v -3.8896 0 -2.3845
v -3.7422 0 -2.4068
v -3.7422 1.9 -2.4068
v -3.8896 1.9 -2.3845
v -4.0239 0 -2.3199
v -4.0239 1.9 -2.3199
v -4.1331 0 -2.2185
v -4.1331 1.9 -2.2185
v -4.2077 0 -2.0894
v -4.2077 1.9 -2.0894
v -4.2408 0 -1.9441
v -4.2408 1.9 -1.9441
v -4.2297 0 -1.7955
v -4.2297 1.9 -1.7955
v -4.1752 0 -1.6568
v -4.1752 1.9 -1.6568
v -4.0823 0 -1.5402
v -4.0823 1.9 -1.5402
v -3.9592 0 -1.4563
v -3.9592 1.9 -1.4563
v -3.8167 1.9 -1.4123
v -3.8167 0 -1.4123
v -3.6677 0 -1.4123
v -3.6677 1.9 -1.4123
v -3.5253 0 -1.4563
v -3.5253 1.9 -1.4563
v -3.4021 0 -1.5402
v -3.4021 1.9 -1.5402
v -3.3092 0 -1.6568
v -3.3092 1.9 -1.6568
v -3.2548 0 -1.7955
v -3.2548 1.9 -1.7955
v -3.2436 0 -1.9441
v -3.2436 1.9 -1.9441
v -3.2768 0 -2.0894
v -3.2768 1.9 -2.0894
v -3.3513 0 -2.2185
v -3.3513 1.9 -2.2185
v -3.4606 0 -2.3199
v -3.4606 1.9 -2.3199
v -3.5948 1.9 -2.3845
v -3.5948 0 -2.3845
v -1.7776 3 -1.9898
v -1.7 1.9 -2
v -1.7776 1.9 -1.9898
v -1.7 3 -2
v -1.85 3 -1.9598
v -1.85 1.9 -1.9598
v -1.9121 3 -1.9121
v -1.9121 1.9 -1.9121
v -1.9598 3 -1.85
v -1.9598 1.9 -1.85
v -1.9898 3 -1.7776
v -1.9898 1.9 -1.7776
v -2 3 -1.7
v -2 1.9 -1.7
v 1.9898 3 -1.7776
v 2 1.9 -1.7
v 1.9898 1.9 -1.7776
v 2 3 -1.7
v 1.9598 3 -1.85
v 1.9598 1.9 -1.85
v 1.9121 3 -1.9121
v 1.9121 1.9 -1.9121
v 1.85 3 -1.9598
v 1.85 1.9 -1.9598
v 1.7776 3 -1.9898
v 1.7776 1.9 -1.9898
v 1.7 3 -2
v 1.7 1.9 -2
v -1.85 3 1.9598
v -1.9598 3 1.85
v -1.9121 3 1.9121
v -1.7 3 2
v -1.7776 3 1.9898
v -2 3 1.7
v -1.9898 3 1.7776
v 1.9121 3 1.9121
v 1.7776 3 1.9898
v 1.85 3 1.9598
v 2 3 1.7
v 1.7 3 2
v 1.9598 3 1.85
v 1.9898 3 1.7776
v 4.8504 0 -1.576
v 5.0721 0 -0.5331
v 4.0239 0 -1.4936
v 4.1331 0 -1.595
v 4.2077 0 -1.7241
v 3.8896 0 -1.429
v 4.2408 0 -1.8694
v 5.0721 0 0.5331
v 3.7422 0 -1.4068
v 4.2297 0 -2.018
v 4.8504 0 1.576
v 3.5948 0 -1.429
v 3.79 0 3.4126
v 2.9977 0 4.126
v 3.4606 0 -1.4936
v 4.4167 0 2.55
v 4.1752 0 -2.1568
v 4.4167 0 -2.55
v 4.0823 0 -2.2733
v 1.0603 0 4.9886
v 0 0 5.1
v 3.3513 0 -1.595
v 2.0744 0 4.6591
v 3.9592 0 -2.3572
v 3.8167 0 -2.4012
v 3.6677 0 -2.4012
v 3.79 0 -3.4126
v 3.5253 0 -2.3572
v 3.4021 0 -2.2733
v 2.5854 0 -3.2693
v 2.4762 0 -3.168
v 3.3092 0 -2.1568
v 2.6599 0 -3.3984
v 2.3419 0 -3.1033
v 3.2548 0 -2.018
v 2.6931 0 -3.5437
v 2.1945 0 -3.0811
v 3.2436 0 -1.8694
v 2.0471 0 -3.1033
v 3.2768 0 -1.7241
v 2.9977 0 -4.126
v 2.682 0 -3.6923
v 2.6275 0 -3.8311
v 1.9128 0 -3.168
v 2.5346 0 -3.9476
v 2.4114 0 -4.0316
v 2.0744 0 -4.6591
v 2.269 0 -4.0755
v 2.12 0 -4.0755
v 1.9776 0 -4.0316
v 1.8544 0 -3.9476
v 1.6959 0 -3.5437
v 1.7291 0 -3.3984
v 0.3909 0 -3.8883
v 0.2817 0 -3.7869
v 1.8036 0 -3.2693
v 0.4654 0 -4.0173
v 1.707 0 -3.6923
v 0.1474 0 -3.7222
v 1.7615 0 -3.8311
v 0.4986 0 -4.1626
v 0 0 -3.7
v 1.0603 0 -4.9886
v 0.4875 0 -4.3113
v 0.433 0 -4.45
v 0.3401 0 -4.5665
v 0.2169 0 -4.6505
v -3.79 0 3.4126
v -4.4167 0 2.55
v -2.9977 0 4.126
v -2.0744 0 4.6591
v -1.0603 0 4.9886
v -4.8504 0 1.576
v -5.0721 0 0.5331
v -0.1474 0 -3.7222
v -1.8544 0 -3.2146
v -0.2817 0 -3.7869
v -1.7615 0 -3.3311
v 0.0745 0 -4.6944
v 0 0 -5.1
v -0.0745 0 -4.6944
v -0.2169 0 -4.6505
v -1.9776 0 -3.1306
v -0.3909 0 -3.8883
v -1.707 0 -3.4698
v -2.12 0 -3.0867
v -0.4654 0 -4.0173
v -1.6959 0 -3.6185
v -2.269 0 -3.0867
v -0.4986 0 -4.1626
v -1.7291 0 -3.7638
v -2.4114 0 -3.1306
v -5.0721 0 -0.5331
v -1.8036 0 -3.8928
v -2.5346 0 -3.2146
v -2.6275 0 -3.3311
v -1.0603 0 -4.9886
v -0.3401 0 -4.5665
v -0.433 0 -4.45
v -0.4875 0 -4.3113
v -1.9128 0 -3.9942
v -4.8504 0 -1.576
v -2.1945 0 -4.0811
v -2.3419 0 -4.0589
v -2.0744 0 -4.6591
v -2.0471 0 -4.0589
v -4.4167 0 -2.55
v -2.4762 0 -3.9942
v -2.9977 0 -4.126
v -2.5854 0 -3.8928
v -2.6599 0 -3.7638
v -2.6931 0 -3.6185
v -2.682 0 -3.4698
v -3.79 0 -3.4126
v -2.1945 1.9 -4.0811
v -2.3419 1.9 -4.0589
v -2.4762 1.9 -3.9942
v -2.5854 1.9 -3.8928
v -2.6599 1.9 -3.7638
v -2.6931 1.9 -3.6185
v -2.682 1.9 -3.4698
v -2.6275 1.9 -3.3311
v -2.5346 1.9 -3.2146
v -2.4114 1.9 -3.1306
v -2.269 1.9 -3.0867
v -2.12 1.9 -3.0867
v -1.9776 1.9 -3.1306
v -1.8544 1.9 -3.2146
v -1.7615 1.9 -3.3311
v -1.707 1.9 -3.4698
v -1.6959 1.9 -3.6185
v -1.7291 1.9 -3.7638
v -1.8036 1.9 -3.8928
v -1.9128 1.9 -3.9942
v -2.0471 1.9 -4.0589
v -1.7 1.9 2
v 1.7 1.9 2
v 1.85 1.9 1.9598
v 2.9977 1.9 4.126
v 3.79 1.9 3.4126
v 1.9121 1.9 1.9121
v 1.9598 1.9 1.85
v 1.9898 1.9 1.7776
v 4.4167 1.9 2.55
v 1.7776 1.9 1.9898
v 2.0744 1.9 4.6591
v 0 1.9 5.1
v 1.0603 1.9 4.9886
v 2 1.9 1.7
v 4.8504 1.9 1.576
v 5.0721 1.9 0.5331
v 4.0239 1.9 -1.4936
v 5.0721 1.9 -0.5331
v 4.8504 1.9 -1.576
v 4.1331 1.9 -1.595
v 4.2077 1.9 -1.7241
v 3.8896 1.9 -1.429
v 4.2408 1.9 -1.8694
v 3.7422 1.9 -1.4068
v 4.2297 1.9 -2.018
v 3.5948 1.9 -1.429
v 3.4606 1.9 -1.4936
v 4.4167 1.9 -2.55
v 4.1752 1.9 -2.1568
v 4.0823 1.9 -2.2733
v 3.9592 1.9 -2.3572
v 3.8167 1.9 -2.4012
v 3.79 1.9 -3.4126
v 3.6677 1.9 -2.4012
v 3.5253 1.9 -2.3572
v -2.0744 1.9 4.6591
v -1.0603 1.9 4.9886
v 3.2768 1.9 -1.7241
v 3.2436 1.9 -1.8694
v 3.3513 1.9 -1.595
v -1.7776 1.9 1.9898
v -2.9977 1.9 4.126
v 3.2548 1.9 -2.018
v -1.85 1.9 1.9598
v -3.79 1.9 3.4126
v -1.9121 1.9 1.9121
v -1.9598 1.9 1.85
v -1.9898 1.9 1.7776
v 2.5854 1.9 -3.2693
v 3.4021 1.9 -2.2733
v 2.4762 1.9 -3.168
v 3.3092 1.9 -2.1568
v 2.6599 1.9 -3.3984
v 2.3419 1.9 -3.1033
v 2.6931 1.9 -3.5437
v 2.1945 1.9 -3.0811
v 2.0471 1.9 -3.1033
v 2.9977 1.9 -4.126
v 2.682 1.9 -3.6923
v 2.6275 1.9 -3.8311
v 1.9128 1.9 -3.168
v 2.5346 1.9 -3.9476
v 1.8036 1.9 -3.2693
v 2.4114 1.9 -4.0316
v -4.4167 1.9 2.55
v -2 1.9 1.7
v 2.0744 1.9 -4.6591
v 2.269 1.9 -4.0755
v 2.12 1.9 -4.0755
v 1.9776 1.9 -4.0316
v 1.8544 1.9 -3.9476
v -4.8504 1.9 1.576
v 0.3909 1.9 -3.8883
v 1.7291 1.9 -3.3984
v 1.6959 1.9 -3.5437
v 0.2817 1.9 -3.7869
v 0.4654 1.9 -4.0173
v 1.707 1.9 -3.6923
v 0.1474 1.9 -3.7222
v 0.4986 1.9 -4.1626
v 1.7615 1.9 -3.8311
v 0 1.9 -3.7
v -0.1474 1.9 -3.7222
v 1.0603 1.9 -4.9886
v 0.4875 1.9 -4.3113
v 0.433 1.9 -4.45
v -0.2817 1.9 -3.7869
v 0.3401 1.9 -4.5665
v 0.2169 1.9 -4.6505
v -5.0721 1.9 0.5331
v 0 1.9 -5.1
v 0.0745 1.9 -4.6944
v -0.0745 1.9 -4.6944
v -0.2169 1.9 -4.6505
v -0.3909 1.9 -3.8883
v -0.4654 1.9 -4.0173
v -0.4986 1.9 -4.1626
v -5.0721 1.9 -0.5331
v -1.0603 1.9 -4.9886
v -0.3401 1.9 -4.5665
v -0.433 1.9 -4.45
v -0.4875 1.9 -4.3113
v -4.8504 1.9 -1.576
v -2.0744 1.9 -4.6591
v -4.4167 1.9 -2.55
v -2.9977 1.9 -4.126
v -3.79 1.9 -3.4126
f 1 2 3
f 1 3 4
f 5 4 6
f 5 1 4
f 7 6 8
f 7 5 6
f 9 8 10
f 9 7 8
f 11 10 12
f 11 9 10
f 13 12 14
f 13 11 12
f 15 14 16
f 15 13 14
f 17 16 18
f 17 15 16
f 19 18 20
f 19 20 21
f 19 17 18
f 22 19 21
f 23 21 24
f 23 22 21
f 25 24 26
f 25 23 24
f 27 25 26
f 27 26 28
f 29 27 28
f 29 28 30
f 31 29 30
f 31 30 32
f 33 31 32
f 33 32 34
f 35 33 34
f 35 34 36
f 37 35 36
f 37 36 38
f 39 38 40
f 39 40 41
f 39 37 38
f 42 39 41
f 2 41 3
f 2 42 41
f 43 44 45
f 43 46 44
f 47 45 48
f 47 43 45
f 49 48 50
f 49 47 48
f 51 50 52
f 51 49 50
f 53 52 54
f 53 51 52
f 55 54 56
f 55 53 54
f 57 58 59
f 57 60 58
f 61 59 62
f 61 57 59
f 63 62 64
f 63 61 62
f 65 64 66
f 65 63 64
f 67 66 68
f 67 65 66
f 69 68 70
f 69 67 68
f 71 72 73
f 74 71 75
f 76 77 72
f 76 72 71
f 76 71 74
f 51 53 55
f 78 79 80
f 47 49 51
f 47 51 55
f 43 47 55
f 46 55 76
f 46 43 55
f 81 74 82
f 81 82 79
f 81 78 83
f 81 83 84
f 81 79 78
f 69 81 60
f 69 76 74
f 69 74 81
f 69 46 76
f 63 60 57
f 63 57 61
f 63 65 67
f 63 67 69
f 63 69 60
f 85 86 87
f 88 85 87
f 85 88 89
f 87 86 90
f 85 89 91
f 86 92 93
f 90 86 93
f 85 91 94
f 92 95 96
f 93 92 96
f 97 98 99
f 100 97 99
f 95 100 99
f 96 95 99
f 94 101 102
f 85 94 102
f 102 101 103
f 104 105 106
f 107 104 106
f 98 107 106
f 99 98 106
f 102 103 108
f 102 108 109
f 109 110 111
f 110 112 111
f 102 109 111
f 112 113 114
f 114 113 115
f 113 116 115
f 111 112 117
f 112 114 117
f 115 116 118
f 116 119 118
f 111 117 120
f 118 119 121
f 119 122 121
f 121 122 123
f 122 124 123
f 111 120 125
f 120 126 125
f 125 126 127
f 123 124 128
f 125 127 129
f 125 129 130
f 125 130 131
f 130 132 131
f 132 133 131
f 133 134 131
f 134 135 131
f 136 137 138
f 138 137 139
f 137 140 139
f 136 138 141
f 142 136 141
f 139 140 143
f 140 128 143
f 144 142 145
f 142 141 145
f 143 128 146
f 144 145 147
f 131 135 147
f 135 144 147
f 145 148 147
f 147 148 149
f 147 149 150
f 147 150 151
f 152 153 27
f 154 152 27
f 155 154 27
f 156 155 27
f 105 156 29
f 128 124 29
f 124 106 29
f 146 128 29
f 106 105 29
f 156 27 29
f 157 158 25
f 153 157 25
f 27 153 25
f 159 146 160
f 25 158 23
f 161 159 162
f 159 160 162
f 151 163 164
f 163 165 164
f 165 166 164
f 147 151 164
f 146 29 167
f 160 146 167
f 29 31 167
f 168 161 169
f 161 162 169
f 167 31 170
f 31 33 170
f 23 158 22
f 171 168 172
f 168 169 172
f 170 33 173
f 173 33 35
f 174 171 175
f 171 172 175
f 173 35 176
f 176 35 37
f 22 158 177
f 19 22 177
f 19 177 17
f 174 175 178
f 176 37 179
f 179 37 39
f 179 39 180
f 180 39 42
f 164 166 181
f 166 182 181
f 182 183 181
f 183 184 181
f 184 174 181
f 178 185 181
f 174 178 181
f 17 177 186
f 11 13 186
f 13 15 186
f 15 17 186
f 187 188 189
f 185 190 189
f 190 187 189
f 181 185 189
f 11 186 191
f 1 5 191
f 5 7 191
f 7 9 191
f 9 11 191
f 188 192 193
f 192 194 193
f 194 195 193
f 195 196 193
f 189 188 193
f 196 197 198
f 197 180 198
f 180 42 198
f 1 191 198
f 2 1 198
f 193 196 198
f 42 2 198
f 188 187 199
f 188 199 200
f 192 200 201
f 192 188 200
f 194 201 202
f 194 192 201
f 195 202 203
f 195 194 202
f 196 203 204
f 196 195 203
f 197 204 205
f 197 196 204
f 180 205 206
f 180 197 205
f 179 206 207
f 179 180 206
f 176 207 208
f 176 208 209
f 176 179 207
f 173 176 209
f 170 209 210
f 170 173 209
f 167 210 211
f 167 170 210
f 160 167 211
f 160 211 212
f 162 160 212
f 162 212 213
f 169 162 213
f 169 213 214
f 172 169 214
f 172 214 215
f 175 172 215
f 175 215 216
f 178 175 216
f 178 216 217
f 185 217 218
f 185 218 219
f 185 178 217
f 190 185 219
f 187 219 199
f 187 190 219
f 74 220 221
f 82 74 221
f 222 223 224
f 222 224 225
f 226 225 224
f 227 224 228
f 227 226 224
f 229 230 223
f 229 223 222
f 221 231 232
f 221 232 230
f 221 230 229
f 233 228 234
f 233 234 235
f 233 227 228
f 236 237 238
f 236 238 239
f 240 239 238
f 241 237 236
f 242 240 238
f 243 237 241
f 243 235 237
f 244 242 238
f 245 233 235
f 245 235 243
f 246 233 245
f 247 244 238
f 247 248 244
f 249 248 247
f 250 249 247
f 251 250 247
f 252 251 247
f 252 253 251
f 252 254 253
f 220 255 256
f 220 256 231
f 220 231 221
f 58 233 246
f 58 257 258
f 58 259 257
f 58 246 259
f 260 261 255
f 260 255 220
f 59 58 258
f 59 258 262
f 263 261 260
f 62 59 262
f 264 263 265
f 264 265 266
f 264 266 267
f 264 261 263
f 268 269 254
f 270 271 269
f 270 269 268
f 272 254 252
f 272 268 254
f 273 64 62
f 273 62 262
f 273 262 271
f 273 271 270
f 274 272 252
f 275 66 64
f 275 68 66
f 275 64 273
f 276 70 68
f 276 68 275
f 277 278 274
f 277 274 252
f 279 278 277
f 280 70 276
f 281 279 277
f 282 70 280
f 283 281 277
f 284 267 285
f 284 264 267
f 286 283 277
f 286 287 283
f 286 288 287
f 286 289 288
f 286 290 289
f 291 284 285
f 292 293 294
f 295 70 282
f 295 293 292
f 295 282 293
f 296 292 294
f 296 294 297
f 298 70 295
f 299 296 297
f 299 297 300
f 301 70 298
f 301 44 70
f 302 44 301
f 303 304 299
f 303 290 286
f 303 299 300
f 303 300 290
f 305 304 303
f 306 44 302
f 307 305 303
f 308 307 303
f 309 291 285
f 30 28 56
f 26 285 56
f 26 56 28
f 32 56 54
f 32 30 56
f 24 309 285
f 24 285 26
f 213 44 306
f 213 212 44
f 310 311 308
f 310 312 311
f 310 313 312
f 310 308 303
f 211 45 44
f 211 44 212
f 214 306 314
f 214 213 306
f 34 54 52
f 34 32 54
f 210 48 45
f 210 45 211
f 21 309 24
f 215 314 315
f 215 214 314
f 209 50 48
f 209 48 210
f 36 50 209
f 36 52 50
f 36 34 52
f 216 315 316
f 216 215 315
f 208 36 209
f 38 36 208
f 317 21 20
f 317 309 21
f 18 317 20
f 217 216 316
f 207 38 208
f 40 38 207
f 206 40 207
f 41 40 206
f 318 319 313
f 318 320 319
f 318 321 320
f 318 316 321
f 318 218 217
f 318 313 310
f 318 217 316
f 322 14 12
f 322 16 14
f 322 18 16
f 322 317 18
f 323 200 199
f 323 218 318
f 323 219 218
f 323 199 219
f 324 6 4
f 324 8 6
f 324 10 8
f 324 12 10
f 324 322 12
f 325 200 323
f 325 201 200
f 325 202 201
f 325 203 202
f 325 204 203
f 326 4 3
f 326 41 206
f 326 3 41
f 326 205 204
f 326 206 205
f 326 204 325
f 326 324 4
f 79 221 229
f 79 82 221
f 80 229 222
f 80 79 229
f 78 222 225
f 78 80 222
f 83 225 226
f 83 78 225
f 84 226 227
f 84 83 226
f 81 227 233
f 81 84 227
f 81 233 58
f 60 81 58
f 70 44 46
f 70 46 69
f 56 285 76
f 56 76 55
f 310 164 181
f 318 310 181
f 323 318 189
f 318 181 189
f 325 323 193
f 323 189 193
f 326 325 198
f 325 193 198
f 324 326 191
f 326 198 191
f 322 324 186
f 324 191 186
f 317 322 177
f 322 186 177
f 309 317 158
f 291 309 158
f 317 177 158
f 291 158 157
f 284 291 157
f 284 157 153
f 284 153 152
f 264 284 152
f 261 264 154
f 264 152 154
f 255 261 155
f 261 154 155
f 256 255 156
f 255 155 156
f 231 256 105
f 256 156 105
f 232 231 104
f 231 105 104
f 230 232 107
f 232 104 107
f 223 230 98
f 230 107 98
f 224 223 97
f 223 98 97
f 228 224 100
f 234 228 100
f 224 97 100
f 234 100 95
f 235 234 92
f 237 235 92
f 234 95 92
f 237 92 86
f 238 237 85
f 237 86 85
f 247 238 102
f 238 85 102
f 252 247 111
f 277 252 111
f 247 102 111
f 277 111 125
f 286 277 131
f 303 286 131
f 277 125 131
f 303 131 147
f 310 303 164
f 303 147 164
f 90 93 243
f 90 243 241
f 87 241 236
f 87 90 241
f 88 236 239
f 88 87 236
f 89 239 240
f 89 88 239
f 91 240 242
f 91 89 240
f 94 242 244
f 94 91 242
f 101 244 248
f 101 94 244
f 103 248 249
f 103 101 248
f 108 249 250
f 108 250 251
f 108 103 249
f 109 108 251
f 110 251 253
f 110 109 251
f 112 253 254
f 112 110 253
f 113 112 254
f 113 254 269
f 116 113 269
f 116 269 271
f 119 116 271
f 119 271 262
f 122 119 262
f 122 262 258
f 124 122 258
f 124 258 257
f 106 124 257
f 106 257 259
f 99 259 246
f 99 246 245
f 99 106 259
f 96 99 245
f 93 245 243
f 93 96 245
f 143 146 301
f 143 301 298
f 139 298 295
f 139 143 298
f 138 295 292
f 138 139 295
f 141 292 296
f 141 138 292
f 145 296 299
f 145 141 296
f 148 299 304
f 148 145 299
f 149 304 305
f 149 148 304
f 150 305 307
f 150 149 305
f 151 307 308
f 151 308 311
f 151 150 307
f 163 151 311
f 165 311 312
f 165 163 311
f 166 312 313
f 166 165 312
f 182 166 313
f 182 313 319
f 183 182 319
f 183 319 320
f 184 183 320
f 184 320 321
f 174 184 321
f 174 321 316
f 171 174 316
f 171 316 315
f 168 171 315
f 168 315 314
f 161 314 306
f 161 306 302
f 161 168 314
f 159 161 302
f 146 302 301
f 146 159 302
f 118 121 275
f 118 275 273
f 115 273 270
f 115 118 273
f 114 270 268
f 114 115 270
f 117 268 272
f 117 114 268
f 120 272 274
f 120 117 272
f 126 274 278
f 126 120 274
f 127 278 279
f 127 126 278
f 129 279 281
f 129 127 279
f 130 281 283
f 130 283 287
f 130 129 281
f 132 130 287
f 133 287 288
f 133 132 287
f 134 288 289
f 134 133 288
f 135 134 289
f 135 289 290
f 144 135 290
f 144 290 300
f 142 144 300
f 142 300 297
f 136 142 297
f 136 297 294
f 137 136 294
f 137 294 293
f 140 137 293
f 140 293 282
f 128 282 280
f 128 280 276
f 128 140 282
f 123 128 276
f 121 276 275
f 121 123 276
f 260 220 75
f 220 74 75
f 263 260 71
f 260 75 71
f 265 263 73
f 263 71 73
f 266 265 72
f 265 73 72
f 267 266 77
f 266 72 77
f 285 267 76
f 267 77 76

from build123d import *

# Parameters (mm, degrees)
SKIZZE1_R                       = 5.1
SKIZZE1_R_2                     = 0.5
AUFSATZ_LINEAR_AUSTRAGEN1_DEPTH = 1.9
SKIZZE2_W                       = 4
SKIZZE2_H                       = 4
AUFSATZ_LINEAR_AUSTRAGEN2_DEPTH = 1.1
VERRUNDUNG1_R                   = 0.3


with BuildPart() as part:
    # Skizze1 → Aufsatz-Linear austragen1 (new body)
    with BuildSketch(Plane(origin=(0, 0, 0), x_dir=(1, 0, 0), z_dir=(0, 1, 0))):
        Circle(SKIZZE1_R)
        with Locations((0, 4.2)):
            Circle(SKIZZE1_R_2, mode=Mode.SUBTRACT)
        with Locations((2.194493972, 3.58108869)):
            Circle(SKIZZE1_R_2, mode=Mode.SUBTRACT)
        with Locations((3.742227402, 1.906760099)):
            Circle(SKIZZE1_R_2, mode=Mode.SUBTRACT)
        with Locations((-3.742227402, 1.906760099)):
            Circle(SKIZZE1_R_2, mode=Mode.SUBTRACT)
        with Locations((-2.194493972, 3.58108869)):
            Circle(SKIZZE1_R_2, mode=Mode.SUBTRACT)
    extrude(amount=AUFSATZ_LINEAR_AUSTRAGEN1_DEPTH)

    # Skizze2 → Aufsatz-Linear austragen2 (add)
    with BuildSketch(Plane(origin=(0, 1.9, 0), x_dir=(1, 0, 0), z_dir=(0, 1, 0))):
        Rectangle(SKIZZE2_W, SKIZZE2_H)
    extrude(amount=AUFSATZ_LINEAR_AUSTRAGEN2_DEPTH)

    # Verrundung1
    verrundung1_edges = [part.edges().sort_by_distance(p)[0] for p in [
        (-2, 2.45, 2),
        (2, 2.45, 2),
        (2, 2.45, -2),
        (-2, 2.45, -2),
    ]]
    fillet(verrundung1_edges, radius=VERRUNDUNG1_R)


solid = part.part
